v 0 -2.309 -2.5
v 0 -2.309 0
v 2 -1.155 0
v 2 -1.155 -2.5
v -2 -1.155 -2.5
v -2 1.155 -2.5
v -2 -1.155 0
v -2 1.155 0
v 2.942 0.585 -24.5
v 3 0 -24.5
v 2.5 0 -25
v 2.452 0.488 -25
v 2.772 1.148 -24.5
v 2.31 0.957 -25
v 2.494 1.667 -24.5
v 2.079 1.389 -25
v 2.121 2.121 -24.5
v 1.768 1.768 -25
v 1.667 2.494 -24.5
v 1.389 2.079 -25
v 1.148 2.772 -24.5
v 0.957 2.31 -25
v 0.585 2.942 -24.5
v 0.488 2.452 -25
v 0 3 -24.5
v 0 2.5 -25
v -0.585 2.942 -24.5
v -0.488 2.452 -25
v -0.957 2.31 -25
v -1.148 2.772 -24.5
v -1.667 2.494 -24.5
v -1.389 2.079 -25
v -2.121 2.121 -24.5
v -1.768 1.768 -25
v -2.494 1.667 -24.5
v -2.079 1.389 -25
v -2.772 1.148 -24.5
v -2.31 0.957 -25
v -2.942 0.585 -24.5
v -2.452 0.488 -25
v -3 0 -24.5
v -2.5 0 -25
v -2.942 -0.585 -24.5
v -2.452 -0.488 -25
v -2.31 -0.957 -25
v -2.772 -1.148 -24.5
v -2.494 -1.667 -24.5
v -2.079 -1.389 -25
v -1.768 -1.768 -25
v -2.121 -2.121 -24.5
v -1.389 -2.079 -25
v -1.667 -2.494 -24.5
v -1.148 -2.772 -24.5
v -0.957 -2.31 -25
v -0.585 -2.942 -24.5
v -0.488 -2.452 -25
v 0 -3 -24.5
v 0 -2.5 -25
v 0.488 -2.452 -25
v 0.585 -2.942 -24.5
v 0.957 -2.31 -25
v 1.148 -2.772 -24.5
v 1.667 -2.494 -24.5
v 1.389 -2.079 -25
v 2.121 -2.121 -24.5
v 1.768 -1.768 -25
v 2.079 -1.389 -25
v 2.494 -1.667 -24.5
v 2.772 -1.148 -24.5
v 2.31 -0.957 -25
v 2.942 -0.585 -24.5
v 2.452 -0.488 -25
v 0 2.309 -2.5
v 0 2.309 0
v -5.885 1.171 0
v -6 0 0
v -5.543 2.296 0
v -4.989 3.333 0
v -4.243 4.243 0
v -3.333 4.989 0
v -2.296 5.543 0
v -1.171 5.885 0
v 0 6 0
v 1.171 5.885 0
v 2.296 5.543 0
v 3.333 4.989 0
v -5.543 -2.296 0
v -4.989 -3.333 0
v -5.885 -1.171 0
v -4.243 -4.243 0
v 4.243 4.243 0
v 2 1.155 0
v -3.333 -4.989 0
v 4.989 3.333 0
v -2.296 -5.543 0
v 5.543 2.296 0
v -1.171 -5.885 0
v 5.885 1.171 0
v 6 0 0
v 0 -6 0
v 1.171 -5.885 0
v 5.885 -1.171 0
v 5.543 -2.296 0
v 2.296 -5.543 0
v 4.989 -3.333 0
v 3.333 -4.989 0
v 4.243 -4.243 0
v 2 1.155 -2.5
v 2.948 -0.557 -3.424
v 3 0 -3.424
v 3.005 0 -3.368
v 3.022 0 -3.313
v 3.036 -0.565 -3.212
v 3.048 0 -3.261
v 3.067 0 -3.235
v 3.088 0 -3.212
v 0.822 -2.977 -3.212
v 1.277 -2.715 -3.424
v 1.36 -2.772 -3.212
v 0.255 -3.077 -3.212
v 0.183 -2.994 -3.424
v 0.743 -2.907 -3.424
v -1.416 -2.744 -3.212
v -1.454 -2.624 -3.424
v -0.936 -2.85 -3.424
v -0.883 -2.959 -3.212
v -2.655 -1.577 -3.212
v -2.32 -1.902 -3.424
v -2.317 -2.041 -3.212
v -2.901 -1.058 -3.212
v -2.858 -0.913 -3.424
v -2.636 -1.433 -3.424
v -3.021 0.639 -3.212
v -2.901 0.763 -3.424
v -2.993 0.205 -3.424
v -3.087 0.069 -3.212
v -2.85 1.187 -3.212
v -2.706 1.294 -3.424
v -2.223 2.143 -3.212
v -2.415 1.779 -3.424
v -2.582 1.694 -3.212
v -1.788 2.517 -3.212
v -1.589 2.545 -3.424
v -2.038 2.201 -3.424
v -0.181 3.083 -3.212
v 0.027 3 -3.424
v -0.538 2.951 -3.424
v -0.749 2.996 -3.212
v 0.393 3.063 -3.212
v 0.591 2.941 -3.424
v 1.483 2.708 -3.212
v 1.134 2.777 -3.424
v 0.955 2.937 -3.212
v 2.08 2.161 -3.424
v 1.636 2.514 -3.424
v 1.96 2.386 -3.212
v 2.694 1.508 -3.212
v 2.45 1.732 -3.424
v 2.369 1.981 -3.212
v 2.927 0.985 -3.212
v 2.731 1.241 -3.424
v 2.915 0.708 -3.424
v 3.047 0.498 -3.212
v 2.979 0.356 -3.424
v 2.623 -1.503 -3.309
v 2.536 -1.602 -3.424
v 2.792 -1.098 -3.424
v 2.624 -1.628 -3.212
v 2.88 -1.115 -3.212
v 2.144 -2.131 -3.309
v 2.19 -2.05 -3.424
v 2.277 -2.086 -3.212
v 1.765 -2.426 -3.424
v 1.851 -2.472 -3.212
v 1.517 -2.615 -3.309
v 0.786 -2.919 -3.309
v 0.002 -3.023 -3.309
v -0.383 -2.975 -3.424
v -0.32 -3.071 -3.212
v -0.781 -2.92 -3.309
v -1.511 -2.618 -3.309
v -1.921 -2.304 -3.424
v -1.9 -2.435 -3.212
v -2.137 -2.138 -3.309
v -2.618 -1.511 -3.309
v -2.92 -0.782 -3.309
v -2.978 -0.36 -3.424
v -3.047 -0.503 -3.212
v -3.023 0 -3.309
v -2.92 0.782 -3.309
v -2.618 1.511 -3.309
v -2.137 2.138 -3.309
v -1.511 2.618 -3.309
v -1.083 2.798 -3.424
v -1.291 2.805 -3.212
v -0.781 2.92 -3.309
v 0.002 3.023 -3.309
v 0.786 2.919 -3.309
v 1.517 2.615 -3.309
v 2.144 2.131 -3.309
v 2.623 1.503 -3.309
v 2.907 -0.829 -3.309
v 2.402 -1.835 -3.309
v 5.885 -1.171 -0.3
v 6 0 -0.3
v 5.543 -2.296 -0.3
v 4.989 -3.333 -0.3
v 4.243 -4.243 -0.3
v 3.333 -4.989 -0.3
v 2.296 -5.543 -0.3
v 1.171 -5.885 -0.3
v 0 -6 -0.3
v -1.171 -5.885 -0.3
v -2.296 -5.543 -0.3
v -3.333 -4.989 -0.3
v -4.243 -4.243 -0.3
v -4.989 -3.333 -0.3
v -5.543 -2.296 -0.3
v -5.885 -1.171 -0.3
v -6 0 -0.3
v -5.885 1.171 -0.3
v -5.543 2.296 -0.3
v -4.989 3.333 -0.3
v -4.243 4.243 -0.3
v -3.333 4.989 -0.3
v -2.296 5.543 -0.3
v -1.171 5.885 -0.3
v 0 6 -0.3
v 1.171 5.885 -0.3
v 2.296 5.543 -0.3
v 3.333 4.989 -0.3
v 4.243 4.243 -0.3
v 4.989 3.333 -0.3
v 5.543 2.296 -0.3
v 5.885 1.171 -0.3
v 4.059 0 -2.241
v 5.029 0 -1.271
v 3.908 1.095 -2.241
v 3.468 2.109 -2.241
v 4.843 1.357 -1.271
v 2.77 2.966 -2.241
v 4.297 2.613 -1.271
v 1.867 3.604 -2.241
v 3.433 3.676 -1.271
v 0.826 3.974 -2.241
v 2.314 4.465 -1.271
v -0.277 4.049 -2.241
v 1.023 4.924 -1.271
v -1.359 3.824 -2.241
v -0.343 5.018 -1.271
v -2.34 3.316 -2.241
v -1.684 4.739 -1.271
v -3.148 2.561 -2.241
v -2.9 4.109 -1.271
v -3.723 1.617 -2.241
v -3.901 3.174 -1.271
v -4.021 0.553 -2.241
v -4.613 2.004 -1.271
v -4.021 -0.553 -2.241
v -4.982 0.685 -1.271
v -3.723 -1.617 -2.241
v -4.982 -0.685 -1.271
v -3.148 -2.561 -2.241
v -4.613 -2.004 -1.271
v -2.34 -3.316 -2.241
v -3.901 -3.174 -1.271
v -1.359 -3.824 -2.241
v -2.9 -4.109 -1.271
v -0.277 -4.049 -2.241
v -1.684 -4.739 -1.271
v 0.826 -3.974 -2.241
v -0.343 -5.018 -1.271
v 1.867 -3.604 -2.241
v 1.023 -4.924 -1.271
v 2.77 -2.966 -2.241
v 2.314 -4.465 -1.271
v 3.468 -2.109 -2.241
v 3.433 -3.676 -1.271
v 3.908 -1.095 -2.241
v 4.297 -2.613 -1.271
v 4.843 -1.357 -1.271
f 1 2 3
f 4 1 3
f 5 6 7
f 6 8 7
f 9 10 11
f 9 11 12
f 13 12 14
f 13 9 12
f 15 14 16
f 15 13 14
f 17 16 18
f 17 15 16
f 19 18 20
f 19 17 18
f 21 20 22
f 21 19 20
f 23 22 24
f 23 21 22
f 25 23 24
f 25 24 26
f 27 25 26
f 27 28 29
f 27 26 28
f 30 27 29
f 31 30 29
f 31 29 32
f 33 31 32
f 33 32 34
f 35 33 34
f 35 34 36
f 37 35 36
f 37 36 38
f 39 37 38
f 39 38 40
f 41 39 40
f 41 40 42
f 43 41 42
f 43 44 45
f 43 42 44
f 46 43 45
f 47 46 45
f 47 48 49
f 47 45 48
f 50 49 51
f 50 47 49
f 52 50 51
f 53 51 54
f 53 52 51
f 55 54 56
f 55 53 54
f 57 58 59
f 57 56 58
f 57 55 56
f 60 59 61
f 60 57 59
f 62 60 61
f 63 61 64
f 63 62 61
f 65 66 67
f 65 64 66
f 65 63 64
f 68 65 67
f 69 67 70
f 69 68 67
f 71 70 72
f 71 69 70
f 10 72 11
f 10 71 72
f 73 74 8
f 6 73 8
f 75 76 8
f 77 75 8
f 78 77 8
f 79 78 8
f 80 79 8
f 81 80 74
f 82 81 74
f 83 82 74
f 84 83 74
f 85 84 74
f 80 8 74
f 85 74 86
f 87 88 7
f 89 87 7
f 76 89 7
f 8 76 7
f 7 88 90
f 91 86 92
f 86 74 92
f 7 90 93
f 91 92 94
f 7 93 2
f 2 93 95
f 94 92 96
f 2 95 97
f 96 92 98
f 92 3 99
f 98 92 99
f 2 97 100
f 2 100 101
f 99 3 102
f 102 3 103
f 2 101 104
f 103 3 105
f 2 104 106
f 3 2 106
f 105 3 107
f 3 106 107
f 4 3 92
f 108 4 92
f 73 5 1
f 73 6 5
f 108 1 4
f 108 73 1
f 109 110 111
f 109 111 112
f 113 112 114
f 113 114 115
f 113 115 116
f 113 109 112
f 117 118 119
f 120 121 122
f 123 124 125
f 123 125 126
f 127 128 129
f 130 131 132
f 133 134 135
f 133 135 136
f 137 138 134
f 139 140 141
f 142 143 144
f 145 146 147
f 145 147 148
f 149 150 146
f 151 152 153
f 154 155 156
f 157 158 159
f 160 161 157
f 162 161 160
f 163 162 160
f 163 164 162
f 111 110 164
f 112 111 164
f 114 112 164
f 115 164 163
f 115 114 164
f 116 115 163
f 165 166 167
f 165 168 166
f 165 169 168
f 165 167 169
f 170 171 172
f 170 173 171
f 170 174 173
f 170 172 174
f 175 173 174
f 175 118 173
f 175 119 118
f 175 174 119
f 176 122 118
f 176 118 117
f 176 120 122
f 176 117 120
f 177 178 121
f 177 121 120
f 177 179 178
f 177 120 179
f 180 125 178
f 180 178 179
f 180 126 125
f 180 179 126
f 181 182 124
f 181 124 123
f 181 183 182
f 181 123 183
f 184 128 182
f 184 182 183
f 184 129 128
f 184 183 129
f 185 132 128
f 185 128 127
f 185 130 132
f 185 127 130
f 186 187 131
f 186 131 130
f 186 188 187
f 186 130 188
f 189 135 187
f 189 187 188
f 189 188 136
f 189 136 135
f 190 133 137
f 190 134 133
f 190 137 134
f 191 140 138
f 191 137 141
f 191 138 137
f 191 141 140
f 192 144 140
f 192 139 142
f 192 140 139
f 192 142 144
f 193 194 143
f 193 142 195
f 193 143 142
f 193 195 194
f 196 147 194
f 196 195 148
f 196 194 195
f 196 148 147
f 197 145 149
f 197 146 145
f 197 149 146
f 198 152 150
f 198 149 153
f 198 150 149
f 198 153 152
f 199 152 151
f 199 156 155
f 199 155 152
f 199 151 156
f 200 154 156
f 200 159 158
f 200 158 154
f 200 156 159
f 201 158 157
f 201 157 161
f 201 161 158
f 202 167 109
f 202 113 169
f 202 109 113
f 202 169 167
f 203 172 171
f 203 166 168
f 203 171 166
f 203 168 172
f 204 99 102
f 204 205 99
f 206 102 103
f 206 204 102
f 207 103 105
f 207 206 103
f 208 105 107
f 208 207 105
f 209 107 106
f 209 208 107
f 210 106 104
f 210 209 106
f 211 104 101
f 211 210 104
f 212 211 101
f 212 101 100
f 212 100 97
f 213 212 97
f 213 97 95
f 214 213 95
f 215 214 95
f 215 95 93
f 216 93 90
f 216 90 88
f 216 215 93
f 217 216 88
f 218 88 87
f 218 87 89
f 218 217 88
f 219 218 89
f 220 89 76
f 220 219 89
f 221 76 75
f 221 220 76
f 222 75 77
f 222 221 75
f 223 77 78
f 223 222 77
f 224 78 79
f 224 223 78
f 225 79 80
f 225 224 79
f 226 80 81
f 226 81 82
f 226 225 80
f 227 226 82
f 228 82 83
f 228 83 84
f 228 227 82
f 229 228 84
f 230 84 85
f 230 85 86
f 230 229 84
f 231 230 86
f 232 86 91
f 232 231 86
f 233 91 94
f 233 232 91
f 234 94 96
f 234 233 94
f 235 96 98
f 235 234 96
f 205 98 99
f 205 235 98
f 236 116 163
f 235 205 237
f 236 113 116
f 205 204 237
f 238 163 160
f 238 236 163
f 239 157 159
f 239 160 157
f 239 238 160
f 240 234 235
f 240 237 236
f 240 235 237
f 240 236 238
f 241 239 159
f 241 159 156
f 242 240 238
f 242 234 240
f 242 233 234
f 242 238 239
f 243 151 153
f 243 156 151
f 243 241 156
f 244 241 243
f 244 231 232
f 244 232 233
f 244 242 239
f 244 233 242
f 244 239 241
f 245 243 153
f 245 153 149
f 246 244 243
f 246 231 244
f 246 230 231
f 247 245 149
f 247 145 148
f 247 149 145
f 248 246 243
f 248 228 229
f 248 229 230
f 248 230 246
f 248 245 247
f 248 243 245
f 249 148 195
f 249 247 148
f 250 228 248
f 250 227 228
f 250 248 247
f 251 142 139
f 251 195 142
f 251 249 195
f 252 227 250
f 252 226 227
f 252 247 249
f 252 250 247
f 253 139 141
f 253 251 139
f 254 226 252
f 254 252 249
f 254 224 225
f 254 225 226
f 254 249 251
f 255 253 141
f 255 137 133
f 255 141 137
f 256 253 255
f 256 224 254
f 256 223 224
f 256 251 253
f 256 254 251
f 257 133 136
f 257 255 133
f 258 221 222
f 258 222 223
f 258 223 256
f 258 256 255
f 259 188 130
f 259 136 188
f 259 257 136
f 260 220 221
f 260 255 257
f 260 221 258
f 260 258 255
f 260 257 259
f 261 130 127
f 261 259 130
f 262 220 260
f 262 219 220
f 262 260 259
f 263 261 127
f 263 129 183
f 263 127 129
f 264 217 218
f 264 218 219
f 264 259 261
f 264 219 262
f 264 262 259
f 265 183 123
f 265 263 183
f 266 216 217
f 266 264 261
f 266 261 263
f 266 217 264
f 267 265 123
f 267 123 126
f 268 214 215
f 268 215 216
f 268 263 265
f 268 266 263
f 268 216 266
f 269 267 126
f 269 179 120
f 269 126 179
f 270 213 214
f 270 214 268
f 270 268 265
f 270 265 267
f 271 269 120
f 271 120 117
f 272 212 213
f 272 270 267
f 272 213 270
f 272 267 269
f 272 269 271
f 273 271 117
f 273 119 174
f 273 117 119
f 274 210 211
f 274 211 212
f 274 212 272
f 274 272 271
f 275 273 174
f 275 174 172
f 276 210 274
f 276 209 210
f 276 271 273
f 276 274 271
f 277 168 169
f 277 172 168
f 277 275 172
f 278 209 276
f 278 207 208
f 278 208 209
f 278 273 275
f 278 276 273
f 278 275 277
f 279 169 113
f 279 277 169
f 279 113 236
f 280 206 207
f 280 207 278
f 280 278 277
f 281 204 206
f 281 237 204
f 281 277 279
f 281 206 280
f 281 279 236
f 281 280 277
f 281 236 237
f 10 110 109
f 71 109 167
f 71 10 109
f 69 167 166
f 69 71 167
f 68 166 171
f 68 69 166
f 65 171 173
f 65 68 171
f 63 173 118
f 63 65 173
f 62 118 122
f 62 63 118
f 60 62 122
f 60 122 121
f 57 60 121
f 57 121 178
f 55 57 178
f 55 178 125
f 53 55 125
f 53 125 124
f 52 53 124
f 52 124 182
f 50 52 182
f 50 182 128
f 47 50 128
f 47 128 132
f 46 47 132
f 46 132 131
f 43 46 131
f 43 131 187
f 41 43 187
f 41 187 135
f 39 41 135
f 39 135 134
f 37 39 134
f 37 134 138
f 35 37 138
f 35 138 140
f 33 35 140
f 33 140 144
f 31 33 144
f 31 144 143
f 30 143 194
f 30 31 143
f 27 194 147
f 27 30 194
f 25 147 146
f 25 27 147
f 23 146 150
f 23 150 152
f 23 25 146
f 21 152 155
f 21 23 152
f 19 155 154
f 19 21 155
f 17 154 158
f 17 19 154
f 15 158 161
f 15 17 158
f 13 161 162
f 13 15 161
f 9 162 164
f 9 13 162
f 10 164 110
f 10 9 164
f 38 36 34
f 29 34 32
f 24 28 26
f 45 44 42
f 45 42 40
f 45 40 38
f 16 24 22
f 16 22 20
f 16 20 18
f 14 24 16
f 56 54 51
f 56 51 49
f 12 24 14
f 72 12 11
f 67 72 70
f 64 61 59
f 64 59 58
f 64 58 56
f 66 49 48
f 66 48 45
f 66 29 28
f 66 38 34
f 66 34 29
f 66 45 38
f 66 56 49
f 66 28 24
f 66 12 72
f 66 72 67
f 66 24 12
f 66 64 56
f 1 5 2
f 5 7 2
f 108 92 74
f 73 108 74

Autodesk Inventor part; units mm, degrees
ref_plane "YZ Plane" through (0, 0, 0) normal (1, 0, 0) x (0, 1, 0)
sketch "Sketch1" plane through (0, 0, 0) normal (0, 1, 0) x (-1, 0, 0)
  point P0 (0, 0)
sketch "Sketch2" plane through (0, 0, 0) normal (0, 1, 0) x (-1, 0, 0)
  line L0 (-3, -25) -> (0, -25)
  line L1 (-3, -3.3) -> (-3, -25)
  line L2 (-6, -0.3) -> (-3, -3.3)
  line L3 (-6, 0) -> (-6, -0.3)
  line L4 (0, 0) -> (-6, 0)
  line L5 (0, -25) -> (0, 0)
  line L6 (0, -25) -> (0, 0)
  line L7 (0, -30) -> (0, 5) projected
  line L8 (1.2, 0) -> (-7.2, 0) projected
  dimension "d3" = 6
  dimension "d5" = 3
  dimension "d7" = 25
  dimension "ParC" = 0.3
  dimension "d22" = 0
  dimension "d23" = 0
  dimension "d43" = 45
revolve "Revolution1" add sketch "Sketch2" angle 360 about axis through (0, 0, -25) along (0, 0, -1)
sketch "Sketch3" plane through (0, 0, 0) normal (0, 0, 1) x (1, 0, 0)
  line L0 (-2, 1.1547) -> (-2, -1.1547)
  line L1 (0, 2.3094) -> (-2, 1.1547)
  line L2 (2, 1.1547) -> (0, 2.3094)
  line L3 (2, -1.1547) -> (2, 1.1547)
  line L4 (0, -2.3094) -> (2, -1.1547)
  line L5 (-2, -1.1547) -> (0, -2.3094)
  circle A0 centre (0, 0) radius 2 construction
  circle A1 centre (0, 0) radius 3 construction
  dimension "d11" = 4
  dimension "d13" = 120
  dimension "d15" = 120
extrude "Extrusion1" cut sketch "Sketch3" against normal blind 2.5
fillet "Fillet1" radius 0.3 1 edges at (-3, 0, -3.3)
chamfer "Chamfer1" distance 0.5 angle 45 1 edges at (-3, 0, -25) measured on face at (2.4612, -1.7154, -17.8081)
thread "Thread1" size "M6x1" class "6g" standard "ISO Metric profile" length 18
ref_plane "MSC_PF1" through (0, 0, 0) normal (1, 0, 0) x (0, 1, 0)
ref_plane "MSC_PT1" through (0, 0, 0) normal (0, 0, -1) x (-1, 0, 0)
equation "\"d3\" = 0.5 * dk"
equation "\"d5\" = 0.5 * NND"
equation "\"d7\" = NLG"
equation "\"d43\" = 0.5 * ang"
equation "\"d18\" = r"
equation "\"d19\" = 0.5 * PTC"
equation "\"d39\" = 0.5 * PTC"
equation "\"d11\" = ParS"
equation "\"d16\" = ParT"
equation "\"NND\" = 6"
equation "\"PTC\" = 1"
equation "\"dk\" = 12"
equation "\"ParK\" = 3.3"
equation "\"ParS\" = 4"
equation "\"ParT\" = 2.5"
equation "\"r\" = 0.3"
equation "\"NLG\" = 25"
equation "\"ang\" = 90deg"
equation "\"THREADDIA\" = NND"
properties part number "CSK Allen Key 6x25mm" material "Steel, Mild"
